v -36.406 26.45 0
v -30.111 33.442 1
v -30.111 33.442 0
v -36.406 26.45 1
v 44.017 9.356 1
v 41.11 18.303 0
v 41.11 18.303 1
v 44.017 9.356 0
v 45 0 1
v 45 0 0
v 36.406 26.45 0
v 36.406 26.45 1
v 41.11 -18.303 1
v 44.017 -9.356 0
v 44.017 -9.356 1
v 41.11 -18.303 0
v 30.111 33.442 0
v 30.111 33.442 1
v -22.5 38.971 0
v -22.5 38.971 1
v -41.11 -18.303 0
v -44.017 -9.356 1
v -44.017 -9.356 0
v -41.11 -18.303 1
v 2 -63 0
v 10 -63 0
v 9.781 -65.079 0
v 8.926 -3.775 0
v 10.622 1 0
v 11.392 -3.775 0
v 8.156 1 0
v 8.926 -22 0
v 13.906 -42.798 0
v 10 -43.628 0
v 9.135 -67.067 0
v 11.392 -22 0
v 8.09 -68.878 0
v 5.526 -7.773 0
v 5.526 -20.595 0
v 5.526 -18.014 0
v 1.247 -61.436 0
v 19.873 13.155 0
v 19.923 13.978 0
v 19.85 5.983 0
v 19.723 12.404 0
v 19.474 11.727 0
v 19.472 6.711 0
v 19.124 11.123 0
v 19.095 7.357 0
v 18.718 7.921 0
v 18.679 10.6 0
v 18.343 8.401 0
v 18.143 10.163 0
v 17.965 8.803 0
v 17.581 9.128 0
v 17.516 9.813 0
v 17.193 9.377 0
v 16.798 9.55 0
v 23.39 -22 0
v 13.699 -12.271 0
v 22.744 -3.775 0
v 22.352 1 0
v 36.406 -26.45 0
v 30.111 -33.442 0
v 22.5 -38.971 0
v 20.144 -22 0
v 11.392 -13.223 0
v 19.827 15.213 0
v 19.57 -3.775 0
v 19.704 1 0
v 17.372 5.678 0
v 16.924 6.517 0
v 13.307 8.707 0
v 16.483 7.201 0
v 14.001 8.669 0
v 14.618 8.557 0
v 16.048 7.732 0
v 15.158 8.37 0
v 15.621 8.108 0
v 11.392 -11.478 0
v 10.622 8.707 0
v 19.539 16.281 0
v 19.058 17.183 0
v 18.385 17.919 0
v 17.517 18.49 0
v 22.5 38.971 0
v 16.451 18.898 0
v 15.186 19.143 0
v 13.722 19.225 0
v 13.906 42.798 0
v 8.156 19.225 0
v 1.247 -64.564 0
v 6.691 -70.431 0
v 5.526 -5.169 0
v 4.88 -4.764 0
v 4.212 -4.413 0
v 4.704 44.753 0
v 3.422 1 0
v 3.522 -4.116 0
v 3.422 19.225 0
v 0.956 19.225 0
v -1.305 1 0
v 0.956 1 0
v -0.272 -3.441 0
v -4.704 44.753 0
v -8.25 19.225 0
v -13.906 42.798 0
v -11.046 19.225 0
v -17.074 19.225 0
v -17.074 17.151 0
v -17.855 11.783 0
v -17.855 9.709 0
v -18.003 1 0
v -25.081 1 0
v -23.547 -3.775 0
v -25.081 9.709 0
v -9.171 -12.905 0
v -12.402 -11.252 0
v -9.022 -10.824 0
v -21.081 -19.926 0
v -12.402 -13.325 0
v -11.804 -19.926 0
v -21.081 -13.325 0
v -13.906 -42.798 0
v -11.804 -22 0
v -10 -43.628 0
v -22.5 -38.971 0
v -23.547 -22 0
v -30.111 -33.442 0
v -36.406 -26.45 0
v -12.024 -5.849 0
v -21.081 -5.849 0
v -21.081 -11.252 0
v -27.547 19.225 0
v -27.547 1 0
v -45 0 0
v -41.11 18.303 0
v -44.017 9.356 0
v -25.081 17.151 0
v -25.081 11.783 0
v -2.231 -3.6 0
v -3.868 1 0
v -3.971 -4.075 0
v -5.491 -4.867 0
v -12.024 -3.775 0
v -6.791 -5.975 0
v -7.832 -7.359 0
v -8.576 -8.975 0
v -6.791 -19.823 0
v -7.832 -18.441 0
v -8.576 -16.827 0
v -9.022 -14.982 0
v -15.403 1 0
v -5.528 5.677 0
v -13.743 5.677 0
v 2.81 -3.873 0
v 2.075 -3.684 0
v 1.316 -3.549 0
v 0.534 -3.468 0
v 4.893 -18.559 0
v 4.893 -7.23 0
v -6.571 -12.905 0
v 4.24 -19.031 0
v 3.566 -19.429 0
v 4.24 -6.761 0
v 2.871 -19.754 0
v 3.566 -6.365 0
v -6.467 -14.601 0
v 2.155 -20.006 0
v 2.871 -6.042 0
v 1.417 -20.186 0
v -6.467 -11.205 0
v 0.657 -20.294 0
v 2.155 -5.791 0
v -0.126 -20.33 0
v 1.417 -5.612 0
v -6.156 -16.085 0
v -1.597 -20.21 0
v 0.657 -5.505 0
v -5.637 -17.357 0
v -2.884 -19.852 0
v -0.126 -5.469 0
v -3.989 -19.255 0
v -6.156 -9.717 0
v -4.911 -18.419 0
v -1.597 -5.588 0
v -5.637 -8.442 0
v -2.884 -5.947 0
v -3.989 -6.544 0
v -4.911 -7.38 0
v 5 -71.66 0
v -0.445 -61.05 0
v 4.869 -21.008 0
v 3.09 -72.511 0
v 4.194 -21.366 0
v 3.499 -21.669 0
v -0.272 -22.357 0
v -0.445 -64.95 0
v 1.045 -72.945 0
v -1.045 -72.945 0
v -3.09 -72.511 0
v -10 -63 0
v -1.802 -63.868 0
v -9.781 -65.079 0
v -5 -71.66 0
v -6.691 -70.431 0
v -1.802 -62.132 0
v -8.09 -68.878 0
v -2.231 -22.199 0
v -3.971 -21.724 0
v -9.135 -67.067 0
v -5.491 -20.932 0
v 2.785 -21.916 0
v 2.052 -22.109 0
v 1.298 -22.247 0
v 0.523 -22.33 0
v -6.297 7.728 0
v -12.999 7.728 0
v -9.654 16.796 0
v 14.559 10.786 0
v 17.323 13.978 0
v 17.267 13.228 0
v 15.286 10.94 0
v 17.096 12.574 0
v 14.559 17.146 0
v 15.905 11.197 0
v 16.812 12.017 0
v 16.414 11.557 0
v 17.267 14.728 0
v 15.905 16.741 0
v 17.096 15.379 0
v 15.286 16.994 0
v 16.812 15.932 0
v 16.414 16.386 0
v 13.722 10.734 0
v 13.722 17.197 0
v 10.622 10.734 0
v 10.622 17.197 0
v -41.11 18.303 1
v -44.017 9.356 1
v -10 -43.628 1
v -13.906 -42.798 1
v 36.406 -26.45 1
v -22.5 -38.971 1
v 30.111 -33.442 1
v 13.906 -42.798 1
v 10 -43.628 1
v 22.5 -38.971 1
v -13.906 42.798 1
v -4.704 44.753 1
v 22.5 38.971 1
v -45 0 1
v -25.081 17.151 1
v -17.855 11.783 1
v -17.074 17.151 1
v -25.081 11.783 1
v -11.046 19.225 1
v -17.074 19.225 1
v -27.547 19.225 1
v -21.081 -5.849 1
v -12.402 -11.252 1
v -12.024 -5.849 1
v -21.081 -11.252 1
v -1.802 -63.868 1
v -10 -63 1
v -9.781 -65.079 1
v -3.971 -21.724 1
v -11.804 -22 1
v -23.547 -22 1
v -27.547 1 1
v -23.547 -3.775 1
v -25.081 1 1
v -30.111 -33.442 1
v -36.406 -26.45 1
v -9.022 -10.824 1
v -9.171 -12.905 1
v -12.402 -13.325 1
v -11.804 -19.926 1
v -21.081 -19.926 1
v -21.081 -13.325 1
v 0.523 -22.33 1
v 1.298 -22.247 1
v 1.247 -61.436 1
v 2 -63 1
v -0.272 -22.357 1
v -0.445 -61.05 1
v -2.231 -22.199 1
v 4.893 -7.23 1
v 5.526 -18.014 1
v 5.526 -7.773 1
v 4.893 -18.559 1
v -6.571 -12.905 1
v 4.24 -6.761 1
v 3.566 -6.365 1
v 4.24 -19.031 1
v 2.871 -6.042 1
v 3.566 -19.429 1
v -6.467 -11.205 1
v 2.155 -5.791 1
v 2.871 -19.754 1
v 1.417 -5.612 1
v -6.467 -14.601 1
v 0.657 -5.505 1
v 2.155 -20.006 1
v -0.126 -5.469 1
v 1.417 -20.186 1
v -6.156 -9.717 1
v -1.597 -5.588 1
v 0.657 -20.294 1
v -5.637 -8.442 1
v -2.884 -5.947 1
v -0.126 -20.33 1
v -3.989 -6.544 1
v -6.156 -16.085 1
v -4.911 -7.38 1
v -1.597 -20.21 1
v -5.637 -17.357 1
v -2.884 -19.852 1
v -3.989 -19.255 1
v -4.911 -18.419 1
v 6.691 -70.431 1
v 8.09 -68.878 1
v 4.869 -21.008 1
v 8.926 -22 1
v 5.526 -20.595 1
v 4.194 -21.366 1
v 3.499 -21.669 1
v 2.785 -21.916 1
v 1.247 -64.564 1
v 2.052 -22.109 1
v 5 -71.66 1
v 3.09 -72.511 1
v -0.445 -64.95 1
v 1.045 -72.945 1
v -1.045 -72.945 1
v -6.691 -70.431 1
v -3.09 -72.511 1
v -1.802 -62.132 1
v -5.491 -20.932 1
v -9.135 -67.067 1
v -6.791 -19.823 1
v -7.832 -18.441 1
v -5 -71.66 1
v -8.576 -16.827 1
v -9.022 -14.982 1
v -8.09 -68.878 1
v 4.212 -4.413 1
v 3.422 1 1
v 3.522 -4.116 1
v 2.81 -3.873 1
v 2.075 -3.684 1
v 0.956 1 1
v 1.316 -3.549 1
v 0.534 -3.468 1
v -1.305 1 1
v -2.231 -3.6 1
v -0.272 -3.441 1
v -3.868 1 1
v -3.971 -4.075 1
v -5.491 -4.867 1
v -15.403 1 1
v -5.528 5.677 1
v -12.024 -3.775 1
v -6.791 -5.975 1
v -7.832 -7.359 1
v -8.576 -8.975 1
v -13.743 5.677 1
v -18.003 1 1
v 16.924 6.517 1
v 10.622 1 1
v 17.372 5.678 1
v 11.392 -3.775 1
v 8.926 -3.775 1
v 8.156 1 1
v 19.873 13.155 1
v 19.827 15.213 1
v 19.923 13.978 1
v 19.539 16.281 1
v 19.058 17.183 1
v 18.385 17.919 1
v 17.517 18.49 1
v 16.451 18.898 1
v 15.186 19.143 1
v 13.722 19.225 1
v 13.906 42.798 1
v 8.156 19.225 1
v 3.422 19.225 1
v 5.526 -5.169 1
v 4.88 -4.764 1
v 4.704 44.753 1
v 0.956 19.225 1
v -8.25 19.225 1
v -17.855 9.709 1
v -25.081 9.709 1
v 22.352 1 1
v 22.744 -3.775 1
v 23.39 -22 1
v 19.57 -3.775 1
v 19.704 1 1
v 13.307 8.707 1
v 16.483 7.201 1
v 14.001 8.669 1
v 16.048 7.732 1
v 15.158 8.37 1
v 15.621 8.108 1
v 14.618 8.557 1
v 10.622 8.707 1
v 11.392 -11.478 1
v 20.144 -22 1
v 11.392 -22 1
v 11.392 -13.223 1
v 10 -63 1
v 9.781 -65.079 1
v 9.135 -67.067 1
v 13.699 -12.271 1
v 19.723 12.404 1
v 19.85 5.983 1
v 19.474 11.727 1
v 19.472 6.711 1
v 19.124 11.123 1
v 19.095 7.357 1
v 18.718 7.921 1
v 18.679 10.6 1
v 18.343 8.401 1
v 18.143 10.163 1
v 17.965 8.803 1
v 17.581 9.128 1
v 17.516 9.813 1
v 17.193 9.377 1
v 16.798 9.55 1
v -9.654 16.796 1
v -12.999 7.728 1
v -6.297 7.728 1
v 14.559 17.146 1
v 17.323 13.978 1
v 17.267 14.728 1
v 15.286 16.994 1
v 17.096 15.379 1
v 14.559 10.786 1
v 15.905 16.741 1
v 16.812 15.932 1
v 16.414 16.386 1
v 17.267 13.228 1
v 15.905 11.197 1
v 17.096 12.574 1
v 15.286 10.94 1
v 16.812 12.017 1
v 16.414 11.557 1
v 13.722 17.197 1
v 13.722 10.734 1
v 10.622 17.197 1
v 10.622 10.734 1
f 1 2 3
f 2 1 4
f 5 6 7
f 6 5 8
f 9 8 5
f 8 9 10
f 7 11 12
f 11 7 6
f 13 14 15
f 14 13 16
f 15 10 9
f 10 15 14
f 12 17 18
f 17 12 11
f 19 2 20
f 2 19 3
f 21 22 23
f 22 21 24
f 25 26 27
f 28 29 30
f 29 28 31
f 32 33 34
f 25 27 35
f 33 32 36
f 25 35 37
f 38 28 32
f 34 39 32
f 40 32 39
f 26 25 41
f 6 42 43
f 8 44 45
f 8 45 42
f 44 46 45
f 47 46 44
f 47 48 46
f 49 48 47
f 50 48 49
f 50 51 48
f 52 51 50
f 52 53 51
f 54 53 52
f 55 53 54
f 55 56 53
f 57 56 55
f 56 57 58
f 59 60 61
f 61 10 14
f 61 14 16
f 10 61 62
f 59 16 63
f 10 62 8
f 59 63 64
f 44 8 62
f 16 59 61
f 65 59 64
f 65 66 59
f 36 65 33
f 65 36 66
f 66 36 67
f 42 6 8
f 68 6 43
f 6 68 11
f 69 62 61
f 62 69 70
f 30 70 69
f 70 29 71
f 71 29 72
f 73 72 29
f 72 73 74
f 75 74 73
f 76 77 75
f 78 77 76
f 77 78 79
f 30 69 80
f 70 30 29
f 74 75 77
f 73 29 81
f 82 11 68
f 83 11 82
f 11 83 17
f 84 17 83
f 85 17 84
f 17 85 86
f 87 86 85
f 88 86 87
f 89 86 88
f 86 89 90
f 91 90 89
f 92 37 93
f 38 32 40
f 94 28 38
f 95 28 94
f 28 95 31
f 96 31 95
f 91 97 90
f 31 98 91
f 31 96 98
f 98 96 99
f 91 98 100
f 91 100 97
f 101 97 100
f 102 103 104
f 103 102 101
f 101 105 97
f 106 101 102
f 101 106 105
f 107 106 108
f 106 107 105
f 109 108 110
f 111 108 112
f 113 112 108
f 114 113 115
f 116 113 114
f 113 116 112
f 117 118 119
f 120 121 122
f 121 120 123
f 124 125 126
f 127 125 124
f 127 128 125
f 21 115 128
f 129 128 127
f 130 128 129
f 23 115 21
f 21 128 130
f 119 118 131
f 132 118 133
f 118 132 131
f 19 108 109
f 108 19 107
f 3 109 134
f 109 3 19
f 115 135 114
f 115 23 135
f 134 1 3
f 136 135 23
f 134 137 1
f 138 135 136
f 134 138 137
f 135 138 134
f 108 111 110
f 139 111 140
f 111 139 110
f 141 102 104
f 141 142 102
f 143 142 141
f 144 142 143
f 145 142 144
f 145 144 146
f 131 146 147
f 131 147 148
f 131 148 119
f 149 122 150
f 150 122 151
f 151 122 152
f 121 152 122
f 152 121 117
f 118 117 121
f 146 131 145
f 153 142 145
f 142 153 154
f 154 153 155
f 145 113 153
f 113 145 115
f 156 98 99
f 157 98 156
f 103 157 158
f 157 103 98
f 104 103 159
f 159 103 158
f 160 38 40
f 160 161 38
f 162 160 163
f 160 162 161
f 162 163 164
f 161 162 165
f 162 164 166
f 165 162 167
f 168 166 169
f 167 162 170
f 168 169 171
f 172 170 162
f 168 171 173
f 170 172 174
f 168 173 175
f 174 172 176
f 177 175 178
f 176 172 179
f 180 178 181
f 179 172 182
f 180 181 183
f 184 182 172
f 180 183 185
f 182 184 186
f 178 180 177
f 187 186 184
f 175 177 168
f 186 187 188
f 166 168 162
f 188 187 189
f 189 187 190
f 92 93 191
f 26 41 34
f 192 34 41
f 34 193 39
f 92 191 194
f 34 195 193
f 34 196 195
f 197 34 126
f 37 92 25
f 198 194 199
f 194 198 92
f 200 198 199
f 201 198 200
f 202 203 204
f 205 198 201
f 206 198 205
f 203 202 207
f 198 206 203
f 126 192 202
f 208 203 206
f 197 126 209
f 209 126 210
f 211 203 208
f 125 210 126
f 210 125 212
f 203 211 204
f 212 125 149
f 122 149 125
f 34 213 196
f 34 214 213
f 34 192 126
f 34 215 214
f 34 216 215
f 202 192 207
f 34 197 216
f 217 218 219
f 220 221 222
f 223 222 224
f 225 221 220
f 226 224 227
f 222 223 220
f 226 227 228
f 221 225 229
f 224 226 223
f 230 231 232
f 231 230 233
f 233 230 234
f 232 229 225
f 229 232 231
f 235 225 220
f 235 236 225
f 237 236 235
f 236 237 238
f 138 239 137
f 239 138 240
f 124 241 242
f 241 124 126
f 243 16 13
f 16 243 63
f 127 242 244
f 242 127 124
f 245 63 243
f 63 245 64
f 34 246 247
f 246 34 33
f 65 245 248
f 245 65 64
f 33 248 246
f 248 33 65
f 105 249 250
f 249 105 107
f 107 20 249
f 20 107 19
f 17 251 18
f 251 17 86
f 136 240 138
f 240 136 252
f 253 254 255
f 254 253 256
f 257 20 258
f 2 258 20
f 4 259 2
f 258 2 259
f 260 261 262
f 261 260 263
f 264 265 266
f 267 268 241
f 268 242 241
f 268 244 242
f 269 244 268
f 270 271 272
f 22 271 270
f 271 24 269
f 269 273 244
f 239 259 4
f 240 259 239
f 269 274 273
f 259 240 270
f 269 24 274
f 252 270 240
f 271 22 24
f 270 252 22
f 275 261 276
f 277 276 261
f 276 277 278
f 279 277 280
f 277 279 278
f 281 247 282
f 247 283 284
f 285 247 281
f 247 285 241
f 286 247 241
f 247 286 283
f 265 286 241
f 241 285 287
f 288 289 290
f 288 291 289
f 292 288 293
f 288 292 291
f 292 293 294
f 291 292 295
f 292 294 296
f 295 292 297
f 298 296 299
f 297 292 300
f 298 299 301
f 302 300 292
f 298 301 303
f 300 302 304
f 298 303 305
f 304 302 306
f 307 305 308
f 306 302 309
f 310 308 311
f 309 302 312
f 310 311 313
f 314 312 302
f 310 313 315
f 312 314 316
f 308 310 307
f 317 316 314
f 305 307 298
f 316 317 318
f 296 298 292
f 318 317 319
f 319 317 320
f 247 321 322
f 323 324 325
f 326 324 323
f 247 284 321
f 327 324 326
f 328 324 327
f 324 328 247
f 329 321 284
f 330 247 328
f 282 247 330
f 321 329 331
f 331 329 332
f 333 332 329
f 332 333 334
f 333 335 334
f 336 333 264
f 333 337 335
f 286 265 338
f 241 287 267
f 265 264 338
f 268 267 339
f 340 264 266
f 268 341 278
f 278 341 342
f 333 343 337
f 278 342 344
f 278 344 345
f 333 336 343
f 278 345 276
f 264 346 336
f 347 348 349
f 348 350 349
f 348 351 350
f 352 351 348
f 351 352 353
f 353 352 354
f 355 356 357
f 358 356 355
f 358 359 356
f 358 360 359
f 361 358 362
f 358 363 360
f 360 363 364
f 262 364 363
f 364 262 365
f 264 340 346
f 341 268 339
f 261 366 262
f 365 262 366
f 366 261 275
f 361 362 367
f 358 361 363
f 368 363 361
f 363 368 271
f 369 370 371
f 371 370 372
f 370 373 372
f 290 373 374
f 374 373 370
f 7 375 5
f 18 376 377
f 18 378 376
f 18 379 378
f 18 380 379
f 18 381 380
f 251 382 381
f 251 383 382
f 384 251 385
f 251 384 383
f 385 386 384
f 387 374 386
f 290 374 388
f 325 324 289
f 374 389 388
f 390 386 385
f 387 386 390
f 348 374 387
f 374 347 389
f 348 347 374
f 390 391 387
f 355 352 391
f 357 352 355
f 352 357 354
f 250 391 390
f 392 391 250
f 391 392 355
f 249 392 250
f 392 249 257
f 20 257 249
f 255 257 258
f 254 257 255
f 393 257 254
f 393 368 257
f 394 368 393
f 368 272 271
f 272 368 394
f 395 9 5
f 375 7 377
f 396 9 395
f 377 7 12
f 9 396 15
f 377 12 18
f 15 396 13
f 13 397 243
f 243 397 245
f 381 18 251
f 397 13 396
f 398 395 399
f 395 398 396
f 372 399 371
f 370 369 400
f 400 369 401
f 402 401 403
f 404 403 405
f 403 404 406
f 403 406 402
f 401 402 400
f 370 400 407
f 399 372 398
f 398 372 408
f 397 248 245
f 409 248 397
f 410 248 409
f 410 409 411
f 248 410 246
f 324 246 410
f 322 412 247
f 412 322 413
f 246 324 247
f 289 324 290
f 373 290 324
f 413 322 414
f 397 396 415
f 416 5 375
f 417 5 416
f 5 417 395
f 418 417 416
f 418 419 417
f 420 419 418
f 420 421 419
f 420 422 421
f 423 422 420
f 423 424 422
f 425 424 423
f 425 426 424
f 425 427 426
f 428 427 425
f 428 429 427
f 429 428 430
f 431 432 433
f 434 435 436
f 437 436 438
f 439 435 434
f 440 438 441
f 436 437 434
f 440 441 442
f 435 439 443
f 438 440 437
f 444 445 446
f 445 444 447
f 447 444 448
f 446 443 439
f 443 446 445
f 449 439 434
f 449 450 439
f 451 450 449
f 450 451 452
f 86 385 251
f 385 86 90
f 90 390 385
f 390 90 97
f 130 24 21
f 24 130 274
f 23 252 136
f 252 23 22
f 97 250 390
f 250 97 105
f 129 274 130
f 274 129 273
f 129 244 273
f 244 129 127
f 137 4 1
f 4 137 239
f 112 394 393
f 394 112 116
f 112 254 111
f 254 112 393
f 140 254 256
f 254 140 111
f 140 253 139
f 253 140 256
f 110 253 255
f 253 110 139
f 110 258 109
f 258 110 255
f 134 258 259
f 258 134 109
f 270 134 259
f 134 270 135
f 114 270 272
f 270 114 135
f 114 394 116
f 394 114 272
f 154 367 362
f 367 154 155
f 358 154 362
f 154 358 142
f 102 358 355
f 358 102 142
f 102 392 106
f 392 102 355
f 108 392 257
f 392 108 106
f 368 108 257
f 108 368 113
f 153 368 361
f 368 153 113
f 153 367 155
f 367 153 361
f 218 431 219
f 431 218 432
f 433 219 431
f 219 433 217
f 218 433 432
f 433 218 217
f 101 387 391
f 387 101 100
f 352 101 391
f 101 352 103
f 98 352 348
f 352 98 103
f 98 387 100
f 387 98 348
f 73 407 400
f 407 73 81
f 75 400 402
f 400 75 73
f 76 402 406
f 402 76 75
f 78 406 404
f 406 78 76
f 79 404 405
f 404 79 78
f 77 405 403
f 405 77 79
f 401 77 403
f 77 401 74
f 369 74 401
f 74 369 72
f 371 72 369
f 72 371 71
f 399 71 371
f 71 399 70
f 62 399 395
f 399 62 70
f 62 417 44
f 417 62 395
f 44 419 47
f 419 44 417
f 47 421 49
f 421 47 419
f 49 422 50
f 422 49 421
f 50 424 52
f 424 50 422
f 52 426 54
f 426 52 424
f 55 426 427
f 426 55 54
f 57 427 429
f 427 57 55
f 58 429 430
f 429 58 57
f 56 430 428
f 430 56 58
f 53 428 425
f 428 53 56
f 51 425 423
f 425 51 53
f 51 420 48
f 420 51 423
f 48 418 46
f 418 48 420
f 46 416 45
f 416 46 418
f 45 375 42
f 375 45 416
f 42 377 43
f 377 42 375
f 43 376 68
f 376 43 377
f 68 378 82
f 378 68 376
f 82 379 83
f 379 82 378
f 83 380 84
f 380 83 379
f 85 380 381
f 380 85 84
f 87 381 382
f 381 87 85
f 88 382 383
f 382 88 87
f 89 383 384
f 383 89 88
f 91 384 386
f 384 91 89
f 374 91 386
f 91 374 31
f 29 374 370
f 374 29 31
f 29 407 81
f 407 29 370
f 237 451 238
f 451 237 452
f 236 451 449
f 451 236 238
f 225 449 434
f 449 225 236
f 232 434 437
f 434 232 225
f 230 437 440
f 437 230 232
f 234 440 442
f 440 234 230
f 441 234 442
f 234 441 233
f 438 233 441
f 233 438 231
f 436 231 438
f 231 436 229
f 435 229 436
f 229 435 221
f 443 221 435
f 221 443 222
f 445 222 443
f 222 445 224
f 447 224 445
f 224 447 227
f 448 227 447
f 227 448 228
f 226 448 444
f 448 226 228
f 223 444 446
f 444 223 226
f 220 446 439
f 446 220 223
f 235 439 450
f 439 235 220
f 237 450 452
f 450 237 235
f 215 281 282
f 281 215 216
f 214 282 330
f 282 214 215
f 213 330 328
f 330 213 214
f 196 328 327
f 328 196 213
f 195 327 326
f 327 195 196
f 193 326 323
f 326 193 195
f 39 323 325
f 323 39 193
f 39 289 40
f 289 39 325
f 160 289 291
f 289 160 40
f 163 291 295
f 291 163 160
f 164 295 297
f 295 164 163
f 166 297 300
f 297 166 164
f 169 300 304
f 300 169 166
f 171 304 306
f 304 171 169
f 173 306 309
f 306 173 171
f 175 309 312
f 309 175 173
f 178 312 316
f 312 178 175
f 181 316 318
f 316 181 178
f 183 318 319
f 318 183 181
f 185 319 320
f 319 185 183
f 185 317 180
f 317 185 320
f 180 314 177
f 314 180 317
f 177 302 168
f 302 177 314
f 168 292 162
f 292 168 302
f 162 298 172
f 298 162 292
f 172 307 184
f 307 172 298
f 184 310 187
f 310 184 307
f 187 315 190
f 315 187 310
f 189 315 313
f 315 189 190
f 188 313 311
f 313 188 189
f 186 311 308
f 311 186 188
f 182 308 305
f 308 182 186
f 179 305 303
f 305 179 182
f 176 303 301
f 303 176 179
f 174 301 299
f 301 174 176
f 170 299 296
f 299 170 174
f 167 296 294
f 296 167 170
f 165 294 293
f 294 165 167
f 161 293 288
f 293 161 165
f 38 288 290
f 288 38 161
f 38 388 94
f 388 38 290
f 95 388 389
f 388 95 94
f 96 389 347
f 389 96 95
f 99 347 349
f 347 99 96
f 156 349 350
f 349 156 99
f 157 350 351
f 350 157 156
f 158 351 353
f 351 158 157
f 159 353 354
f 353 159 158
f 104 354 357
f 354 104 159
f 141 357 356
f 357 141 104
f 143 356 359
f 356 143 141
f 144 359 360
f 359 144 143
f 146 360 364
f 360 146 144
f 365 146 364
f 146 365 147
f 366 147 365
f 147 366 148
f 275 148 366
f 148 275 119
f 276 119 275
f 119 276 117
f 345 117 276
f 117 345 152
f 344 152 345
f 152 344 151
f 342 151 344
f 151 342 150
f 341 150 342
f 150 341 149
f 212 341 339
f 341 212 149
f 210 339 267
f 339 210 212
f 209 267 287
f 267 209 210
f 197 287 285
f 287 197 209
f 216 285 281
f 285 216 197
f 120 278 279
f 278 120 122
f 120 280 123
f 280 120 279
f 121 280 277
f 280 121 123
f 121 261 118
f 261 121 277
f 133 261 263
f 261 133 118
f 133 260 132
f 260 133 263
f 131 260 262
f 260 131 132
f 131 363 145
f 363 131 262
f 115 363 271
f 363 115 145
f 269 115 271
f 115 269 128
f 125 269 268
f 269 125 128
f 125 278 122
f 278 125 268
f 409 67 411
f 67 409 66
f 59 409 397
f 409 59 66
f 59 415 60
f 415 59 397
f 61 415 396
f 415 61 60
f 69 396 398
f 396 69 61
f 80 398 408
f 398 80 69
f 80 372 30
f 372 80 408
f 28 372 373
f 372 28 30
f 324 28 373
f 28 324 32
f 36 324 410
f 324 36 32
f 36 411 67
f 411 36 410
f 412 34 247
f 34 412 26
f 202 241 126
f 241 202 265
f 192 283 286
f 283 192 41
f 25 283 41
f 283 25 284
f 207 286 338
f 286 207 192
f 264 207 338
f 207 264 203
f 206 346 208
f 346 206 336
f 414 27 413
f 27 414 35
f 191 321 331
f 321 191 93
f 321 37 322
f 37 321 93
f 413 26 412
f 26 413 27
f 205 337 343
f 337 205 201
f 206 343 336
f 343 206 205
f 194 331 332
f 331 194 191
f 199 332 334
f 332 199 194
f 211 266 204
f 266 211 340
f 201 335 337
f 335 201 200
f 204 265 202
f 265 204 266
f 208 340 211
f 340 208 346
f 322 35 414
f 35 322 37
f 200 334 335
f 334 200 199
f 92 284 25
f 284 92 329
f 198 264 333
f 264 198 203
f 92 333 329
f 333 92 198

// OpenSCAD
difference() {
 cylinder(1, r=45);
 translate([-30, 1, 0]) linear_extrude(1) text("FAIR", size=18, font="CutOutsFLF:style=Regular");
 translate([-26, - 22, 0])  linear_extrude(1) text("ECK", size=18, font="CutOutsFLF:style=Regular");
}

difference() {
translate([-10, -63, 0]) cube([20,  20, 1]);
translate([0, -63, 0]) cylinder(1, r=2);
}

difference() {
translate([0, -63, 0]) cylinder(1, r=10);
translate([0, -63, 0]) cylinder(1, r=2);
}
